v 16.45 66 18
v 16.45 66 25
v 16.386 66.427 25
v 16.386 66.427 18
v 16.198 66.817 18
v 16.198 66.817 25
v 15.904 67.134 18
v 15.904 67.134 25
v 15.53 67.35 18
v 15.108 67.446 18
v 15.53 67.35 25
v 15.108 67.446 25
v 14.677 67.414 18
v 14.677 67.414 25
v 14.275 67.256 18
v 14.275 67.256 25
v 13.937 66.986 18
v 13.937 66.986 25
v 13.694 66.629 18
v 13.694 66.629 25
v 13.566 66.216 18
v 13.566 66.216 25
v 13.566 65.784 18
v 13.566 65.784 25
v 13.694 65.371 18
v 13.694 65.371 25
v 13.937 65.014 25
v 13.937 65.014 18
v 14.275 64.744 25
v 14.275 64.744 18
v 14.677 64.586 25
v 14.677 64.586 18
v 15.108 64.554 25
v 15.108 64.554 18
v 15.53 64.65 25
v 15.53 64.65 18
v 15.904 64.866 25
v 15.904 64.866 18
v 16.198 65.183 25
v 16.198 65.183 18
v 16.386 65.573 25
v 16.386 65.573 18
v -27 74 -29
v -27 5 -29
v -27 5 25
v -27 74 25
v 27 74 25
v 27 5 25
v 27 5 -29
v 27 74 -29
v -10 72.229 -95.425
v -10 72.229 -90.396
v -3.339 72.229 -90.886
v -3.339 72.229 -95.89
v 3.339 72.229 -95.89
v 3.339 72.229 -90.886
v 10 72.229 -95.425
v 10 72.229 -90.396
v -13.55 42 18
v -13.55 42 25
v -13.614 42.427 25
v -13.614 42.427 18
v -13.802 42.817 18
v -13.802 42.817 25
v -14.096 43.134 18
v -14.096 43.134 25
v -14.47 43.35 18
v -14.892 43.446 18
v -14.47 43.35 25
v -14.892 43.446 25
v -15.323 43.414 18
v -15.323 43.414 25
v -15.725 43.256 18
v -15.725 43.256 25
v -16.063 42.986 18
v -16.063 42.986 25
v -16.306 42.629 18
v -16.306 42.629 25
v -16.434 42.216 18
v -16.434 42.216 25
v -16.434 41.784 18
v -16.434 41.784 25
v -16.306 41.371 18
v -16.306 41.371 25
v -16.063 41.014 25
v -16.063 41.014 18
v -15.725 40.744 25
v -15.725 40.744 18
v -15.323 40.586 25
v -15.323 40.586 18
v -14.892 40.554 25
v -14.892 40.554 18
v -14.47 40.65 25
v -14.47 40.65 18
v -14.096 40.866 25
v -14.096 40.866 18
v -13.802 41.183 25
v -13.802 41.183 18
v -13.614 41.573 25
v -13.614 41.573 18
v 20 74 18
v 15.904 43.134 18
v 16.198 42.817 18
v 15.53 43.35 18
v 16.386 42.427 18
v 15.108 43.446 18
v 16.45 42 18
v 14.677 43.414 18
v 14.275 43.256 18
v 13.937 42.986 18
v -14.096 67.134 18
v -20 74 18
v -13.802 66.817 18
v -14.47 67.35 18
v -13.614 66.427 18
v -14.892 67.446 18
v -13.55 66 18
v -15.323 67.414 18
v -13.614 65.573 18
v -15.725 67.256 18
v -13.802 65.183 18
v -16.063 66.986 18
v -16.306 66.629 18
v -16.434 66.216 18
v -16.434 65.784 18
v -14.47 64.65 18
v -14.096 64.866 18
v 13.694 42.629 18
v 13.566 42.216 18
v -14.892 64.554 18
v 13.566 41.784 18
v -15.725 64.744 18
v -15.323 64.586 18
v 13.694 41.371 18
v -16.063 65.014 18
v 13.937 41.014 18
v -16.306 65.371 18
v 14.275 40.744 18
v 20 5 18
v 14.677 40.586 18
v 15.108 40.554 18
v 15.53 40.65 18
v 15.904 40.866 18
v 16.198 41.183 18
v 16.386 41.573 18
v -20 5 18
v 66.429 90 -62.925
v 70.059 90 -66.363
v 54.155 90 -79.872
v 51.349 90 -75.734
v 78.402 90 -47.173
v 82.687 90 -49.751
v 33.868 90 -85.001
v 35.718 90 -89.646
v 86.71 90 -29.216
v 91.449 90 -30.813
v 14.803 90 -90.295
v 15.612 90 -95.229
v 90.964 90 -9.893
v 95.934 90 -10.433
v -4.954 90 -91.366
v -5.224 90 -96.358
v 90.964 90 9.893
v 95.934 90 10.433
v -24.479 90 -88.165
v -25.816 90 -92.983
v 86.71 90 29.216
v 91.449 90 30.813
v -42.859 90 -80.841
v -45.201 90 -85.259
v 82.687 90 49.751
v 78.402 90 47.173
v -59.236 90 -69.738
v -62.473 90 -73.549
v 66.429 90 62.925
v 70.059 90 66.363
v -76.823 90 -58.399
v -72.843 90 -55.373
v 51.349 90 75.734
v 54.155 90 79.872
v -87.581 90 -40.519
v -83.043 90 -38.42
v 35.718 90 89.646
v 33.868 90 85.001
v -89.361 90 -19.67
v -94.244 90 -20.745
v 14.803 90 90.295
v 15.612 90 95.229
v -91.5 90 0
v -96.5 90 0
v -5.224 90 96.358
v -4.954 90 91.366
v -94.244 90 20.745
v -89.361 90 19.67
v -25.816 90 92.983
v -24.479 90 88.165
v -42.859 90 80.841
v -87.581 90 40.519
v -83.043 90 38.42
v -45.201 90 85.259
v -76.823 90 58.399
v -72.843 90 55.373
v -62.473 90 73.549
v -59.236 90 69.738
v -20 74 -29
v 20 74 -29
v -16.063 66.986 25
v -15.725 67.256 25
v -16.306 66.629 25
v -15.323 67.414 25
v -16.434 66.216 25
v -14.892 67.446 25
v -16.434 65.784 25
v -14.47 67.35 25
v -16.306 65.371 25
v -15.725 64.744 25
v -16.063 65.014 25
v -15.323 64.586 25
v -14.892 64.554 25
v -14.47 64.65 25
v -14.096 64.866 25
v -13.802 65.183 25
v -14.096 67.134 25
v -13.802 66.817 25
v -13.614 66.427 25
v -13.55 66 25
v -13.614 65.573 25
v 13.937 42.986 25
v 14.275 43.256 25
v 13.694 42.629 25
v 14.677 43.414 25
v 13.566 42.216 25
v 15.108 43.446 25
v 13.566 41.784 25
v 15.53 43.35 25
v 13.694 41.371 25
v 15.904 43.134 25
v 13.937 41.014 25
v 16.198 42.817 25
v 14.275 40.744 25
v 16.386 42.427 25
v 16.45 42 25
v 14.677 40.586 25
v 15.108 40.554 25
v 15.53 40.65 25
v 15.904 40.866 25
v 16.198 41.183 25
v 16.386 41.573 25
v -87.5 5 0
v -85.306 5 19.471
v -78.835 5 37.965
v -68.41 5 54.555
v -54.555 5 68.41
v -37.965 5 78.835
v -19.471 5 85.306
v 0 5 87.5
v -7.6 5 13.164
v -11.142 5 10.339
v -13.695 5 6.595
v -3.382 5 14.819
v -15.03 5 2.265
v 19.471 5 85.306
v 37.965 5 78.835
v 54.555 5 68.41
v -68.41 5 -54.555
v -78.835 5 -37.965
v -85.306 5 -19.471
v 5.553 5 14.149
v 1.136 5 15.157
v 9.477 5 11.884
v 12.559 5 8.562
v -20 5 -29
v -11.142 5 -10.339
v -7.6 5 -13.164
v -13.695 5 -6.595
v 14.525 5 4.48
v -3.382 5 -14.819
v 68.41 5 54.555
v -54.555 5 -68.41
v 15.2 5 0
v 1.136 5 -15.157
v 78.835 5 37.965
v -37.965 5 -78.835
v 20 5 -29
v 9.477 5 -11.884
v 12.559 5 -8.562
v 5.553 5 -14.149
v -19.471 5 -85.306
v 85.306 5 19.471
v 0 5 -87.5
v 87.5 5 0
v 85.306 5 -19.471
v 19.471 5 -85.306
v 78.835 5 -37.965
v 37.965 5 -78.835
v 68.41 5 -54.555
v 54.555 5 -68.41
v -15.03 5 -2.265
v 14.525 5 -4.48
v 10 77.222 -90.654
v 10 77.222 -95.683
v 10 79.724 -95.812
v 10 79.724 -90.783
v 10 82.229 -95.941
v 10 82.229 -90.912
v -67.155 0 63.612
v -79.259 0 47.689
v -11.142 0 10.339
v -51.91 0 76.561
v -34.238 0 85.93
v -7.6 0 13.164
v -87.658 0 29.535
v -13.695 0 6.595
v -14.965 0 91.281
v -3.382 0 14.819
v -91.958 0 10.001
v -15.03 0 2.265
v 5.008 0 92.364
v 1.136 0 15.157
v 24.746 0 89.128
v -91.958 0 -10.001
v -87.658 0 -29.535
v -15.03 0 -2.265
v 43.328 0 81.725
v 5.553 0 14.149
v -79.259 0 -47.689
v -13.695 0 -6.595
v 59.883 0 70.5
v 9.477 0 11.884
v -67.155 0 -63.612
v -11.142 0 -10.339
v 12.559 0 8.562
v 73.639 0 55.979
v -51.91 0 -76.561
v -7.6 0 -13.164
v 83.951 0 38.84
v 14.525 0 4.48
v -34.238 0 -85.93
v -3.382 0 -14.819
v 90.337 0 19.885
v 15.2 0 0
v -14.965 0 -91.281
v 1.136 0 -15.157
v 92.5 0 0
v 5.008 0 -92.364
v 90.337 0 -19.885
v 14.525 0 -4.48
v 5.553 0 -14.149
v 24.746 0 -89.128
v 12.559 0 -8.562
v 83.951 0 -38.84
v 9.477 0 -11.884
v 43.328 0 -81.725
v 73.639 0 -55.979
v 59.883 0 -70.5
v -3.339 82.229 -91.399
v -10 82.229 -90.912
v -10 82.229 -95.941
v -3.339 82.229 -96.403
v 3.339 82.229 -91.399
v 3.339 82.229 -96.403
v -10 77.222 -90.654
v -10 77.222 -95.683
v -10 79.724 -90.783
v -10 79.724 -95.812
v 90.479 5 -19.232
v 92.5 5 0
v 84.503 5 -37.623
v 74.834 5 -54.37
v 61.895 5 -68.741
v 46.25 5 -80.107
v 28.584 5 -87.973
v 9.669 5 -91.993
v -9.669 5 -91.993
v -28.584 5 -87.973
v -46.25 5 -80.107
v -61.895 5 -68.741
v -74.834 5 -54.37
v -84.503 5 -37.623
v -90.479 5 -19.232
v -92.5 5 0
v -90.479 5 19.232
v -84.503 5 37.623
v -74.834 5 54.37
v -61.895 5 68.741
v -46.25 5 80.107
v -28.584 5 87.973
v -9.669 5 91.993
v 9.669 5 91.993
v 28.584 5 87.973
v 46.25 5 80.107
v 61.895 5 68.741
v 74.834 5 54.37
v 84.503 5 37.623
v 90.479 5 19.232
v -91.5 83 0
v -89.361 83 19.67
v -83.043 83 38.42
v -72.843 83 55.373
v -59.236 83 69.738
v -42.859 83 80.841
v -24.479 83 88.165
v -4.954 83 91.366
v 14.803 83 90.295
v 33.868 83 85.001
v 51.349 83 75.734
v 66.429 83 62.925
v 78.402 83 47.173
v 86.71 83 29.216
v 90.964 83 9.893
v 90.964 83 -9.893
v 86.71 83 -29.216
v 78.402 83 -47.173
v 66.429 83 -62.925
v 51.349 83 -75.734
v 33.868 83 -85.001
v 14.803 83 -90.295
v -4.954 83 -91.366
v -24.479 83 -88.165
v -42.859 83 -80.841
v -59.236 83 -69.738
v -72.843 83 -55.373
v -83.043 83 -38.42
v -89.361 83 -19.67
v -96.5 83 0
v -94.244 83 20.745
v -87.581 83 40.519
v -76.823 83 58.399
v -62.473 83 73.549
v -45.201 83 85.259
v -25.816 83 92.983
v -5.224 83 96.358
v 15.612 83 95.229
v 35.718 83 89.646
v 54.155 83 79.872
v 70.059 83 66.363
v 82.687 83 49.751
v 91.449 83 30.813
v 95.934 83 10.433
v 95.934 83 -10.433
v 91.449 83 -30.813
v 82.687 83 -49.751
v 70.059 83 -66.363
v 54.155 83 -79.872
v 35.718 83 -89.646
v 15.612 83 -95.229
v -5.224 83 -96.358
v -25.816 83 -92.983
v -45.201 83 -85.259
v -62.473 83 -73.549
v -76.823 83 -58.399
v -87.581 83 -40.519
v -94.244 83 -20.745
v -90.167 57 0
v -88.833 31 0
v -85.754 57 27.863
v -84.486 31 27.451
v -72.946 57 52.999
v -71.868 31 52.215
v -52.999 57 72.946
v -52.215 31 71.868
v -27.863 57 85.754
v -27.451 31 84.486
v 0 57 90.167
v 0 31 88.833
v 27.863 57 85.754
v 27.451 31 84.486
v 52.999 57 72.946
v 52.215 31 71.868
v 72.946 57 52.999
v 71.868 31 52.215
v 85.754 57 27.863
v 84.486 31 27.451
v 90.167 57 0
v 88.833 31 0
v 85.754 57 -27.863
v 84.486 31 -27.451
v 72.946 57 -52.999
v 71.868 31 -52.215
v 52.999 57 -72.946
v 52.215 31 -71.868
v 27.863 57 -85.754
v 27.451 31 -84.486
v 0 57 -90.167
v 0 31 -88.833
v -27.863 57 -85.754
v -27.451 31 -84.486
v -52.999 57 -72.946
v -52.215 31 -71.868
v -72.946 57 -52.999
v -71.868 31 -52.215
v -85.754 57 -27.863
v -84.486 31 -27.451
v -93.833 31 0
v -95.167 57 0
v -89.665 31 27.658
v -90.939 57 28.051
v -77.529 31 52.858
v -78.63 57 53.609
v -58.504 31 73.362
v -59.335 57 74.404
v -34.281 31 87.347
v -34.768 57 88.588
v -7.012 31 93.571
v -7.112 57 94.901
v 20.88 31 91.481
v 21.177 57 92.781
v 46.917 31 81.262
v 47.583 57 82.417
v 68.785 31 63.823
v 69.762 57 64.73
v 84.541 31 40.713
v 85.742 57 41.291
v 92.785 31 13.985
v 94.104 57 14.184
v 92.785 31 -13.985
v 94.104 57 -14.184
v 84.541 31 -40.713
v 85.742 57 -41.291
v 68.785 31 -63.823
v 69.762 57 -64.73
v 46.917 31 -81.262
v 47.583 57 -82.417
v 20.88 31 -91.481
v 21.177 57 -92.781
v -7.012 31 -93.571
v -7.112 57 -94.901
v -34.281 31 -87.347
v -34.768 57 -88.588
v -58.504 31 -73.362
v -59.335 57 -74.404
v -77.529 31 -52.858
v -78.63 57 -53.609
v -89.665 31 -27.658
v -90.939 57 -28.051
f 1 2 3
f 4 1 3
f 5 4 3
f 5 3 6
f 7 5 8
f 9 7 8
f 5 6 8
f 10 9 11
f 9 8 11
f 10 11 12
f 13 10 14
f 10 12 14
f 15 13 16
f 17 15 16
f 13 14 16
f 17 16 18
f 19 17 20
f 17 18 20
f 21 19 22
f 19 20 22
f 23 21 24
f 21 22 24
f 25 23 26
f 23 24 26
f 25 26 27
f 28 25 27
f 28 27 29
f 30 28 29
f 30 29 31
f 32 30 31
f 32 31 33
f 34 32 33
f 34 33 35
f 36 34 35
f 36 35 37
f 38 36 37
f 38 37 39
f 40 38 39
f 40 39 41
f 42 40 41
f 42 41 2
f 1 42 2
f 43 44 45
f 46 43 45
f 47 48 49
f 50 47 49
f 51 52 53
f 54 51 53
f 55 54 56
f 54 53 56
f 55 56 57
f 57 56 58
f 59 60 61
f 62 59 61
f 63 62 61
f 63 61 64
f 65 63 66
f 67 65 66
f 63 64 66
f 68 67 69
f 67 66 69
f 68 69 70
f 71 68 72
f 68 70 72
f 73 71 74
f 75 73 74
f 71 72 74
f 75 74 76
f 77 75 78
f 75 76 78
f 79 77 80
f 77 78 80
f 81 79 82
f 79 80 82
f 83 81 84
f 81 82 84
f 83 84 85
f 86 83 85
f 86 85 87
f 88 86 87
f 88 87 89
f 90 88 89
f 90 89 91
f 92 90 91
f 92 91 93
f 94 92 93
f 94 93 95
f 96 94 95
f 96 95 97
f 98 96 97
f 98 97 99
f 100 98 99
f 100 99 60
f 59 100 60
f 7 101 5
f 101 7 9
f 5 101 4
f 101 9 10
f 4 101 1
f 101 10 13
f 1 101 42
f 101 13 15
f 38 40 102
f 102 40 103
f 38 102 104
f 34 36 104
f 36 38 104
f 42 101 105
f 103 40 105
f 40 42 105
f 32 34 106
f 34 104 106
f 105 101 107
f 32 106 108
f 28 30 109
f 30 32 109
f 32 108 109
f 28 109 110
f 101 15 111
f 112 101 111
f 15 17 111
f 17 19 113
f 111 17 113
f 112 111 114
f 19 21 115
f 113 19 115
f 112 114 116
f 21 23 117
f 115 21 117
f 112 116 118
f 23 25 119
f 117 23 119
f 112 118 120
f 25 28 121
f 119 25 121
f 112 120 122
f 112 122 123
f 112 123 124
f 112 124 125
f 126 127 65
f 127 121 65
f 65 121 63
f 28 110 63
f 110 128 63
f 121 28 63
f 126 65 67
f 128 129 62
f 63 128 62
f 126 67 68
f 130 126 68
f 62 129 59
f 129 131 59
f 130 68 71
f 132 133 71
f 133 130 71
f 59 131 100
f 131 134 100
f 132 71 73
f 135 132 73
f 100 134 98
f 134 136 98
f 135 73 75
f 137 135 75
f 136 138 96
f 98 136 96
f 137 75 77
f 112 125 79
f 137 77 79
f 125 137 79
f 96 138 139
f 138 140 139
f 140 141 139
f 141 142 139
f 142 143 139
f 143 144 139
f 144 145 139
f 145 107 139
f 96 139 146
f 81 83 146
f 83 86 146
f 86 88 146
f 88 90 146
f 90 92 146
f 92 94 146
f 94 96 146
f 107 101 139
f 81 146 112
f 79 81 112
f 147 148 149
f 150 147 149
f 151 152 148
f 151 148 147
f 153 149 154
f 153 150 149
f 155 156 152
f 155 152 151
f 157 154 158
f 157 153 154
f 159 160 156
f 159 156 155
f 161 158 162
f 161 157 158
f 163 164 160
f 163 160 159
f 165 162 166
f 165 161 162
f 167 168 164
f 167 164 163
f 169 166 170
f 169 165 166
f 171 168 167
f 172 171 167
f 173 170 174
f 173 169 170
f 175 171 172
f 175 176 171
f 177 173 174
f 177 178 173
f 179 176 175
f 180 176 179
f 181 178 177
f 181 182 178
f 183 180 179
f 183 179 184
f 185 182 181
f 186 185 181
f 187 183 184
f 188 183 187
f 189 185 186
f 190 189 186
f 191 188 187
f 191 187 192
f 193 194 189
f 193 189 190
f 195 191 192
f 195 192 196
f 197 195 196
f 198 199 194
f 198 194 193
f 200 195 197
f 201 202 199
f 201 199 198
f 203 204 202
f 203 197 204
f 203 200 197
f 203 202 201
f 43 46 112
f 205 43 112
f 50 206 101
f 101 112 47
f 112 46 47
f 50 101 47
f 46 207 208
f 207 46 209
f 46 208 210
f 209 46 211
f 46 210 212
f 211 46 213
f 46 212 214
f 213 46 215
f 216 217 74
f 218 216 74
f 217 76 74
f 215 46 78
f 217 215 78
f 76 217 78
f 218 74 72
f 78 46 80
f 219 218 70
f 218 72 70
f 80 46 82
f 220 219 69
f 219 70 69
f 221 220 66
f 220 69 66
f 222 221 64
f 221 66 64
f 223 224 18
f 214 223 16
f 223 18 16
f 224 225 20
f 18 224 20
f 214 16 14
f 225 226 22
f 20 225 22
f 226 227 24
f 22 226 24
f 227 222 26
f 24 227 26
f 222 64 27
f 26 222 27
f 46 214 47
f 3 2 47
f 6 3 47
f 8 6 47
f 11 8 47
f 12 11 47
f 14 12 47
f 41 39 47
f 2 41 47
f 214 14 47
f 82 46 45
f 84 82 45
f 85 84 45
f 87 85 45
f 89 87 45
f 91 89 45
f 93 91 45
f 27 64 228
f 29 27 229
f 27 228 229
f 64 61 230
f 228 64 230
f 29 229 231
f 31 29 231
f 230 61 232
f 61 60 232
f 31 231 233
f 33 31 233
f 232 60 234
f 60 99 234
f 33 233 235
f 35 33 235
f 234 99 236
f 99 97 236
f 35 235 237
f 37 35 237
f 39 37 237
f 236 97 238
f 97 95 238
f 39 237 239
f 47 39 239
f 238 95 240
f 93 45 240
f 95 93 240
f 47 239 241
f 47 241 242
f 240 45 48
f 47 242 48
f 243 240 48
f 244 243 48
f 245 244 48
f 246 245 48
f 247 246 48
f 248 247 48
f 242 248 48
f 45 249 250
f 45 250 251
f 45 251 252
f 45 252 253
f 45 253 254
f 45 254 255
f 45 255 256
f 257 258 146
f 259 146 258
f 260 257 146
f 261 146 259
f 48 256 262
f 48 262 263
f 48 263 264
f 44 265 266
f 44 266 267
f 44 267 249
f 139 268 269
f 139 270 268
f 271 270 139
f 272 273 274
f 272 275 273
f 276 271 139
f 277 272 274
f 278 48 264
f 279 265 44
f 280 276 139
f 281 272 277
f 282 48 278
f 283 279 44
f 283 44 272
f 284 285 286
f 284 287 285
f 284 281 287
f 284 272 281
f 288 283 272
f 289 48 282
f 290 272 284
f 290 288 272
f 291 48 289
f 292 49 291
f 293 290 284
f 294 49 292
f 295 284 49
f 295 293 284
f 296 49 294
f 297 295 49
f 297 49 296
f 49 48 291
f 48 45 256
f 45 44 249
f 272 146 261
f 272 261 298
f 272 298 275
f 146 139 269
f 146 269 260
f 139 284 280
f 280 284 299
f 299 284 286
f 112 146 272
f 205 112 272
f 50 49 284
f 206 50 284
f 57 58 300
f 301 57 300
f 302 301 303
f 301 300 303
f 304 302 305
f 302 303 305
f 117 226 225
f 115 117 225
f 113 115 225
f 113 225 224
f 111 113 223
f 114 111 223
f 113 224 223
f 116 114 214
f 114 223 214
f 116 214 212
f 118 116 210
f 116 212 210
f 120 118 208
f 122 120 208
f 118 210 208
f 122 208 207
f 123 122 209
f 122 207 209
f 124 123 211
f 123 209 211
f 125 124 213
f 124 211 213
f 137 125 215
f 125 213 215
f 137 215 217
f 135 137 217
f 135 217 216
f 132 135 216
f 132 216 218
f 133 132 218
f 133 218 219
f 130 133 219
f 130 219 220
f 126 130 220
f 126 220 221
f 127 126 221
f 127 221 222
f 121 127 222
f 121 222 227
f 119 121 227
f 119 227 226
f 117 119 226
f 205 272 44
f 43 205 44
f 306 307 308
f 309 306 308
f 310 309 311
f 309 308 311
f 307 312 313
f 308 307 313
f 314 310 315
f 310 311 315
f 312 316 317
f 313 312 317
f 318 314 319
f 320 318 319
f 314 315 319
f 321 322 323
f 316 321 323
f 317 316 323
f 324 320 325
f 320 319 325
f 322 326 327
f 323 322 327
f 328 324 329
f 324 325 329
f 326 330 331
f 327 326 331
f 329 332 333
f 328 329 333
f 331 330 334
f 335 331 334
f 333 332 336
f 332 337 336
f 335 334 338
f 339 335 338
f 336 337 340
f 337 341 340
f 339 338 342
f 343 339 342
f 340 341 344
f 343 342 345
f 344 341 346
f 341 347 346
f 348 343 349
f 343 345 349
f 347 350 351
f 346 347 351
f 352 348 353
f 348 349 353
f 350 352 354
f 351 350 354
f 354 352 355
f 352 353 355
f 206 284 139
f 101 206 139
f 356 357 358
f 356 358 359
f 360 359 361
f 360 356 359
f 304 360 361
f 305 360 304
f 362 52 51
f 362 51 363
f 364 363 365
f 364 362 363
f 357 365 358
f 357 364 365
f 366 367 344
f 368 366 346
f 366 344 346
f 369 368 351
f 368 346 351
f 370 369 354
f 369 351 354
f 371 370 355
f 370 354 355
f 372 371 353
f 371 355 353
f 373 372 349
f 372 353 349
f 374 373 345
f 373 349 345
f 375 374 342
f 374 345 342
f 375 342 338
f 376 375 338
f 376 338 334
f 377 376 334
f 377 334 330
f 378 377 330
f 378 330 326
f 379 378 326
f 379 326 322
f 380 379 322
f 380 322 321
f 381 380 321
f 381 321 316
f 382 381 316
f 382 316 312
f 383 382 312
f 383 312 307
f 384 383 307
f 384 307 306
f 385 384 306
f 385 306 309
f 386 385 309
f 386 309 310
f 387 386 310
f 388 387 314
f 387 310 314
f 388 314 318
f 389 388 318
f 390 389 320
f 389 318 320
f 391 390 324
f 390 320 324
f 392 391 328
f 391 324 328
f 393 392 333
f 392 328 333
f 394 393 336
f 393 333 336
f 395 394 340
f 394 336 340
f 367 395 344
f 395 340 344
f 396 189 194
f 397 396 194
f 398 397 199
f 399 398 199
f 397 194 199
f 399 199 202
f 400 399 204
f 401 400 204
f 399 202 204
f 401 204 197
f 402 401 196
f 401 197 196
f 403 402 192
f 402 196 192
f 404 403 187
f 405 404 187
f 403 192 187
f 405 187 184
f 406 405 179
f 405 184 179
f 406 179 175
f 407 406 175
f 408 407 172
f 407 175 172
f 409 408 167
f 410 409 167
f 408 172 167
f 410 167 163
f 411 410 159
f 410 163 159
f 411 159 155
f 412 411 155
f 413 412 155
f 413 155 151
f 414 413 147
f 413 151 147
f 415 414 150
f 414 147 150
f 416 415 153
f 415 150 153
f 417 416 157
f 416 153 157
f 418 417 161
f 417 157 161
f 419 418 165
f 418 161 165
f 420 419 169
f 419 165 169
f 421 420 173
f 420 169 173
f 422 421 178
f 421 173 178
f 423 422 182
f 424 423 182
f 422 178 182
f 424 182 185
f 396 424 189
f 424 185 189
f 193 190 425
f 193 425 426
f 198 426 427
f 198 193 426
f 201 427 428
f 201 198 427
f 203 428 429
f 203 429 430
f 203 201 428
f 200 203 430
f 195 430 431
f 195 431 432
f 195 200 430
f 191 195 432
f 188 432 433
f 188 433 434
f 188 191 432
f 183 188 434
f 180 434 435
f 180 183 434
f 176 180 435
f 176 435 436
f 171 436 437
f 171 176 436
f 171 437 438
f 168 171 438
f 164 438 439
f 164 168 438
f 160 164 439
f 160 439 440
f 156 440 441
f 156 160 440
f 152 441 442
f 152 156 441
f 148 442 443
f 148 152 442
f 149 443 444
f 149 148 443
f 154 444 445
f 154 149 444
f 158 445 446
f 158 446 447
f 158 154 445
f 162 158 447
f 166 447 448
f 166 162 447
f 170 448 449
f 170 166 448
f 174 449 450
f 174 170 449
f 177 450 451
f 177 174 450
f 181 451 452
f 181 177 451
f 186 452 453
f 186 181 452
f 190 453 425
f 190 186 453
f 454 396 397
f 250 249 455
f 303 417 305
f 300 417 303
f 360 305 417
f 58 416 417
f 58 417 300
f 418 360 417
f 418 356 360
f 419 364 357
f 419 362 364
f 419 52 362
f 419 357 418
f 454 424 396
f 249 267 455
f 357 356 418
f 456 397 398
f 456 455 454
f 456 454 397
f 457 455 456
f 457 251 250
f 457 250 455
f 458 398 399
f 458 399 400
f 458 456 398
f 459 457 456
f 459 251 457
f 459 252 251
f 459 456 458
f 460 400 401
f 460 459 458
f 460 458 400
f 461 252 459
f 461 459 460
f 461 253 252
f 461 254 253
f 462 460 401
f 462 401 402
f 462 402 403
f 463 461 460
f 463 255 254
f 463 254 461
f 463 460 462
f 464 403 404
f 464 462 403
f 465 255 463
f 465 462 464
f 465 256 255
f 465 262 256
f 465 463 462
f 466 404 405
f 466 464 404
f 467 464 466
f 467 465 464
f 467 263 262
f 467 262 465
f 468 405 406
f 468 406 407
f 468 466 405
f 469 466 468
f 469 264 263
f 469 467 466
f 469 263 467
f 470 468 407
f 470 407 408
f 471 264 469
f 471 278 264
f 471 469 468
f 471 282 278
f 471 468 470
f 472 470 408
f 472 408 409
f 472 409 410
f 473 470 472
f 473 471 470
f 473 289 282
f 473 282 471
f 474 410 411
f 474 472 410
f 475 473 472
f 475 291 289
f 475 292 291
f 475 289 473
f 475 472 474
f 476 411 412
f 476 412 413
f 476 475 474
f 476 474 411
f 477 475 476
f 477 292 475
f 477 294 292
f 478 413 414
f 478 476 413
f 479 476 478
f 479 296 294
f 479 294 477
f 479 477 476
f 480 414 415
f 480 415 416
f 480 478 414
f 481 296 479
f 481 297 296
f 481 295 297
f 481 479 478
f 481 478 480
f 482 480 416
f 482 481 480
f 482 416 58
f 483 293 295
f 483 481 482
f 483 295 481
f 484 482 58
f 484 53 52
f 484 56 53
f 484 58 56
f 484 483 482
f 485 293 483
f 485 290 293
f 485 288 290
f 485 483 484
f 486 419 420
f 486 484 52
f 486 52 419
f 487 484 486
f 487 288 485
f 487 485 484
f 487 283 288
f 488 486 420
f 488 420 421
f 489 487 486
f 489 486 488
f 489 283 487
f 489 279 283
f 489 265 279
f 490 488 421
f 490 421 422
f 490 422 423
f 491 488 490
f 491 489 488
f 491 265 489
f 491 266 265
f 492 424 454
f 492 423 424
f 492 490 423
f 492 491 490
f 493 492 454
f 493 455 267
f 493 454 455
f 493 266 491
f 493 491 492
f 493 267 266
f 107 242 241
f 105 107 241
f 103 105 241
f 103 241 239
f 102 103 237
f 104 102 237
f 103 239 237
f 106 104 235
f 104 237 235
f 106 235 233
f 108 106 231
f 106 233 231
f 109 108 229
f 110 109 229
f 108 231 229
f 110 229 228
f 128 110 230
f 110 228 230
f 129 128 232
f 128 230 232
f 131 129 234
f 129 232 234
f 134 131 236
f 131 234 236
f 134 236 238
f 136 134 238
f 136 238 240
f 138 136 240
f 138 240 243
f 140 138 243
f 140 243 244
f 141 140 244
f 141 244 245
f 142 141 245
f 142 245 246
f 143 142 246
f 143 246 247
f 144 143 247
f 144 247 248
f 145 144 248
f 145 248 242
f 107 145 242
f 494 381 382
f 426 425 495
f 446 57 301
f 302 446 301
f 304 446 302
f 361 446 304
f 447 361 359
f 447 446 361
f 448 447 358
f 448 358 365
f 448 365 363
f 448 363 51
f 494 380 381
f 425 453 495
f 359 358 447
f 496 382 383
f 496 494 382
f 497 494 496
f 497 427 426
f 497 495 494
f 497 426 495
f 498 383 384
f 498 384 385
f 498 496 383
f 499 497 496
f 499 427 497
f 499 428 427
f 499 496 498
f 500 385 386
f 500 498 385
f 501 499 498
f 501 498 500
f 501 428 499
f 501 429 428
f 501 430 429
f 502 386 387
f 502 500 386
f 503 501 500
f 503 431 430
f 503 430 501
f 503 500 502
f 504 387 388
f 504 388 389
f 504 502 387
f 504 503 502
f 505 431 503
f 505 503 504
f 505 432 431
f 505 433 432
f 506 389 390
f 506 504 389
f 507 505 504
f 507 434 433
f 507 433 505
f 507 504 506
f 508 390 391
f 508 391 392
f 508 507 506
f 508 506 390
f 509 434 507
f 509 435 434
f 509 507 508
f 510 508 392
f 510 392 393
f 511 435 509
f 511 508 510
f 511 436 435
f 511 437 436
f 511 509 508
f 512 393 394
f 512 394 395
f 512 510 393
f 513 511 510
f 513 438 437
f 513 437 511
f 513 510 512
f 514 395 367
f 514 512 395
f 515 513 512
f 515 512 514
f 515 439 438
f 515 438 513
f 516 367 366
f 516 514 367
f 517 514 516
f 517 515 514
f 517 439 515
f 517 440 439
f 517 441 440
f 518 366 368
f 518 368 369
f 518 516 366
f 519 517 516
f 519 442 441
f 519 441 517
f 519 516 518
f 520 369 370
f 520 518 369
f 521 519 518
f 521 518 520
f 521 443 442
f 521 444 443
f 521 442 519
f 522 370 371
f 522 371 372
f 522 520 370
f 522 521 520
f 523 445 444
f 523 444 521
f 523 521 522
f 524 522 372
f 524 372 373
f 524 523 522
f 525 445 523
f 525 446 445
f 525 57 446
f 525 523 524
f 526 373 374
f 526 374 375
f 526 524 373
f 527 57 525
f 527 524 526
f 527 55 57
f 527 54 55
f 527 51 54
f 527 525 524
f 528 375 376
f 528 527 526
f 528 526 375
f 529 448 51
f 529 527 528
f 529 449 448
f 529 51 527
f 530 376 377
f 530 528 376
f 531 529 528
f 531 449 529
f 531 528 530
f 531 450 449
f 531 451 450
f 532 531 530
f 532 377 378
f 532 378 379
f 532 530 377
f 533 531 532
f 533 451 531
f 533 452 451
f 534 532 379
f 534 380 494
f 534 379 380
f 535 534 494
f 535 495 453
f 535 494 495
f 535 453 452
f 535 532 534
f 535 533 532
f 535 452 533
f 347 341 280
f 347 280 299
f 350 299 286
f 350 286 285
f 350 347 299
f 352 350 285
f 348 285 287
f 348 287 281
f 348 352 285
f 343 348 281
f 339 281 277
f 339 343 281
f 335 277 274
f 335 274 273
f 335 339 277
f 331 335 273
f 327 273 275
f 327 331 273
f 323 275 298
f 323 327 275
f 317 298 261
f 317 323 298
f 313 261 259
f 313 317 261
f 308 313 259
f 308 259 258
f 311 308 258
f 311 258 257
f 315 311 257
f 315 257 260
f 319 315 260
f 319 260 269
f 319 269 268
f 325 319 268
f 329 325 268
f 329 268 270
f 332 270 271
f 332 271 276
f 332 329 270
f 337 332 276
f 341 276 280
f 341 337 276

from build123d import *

# Parameters (mm, degrees)
SKETCH_1_R          = 92.5
SKETCH_1_R_2        = 15.2
EXTRUDE_1_DEPTH     = 5
SKETCH_8_W          = 5
SKETCH_8_H          = 7
EXTRUDE_2_DEPTH     = 85
SKETCH_11_R         = 1.45
CUT_EXTRUDE_1_DEPTH = 85
SKETCH_12_W         = 54
SKETCH_12_H         = 16
CUT_EXTRUDE_2_DEPTH = 85
SKETCH_14_W         = 20
SKETCH_14_H         = 10
CUT_EXTRUDE_3_DEPTH = 100


with BuildPart() as part:
    # 스케치1 → 보스-돌출1 (new body)
    with BuildSketch(Plane(origin=(0, 0, 0), x_dir=(1, 0, 0), z_dir=(0, 1, 0))):
        Circle(SKETCH_1_R)
        Circle(SKETCH_1_R_2, mode=Mode.SUBTRACT)
    extrude(amount=EXTRUDE_1_DEPTH)

    # 스케치5 → 회전1 (revolve)
    with BuildSketch(Plane.XY):
        Polygon((-92.5, 5), (-96.5, 83), (-91.5, 83), (-87.5, 5), align=None)
    revolve(axis=Axis((0, 0, 0), (0, 1, 0)))

    # 스케치8 → 회전3 (revolve)
    with BuildSketch(Plane.XY):
        with Locations((-94, 86.5)):
            Rectangle(SKETCH_8_W, SKETCH_8_H)
    revolve(axis=Axis((0, 0, 0), (0, 1, 0)))

    # 스케치9 → 보스-돌출2 (add)
    with BuildSketch(Plane(origin=(0, 5, 0), x_dir=(1, 0, 0), z_dir=(0, 1, 0))):
        Polygon((-20, -25), (20, -25), (27, -25), (27, 29), (20, 29), (20, -18), (-20, -18), (-20, 29), (-27, 29), (-27, -25), align=None)
    extrude(amount=EXTRUDE_2_DEPTH)

    # 스케치11 → 컷-돌출1 (cut)
    with BuildSketch(Plane.XY.offset(25)):
        with Locations((15, 42)):
            Circle(SKETCH_11_R)
        with Locations((-15, 42)):
            Circle(SKETCH_11_R)
        with Locations((-15, 66)):
            Circle(SKETCH_11_R)
        with Locations((15, 66)):
            Circle(SKETCH_11_R)
    extrude(amount=-CUT_EXTRUDE_1_DEPTH, mode=Mode.SUBTRACT)

    # 스케치12 → 컷-돌출2 (cut)
    with BuildSketch(Plane.XY.offset(25)):
        with Locations((0, 82)):
            Rectangle(SKETCH_12_W, SKETCH_12_H)
    extrude(amount=-CUT_EXTRUDE_2_DEPTH, mode=Mode.SUBTRACT)

    # 스케치14 → 컷-돌출3 (cut)
    with BuildSketch(Plane.XY):
        with Locations((0, 77.228887743)):
            Rectangle(SKETCH_14_W, SKETCH_14_H)
    extrude(amount=-CUT_EXTRUDE_3_DEPTH, mode=Mode.SUBTRACT)


solid = part.part
